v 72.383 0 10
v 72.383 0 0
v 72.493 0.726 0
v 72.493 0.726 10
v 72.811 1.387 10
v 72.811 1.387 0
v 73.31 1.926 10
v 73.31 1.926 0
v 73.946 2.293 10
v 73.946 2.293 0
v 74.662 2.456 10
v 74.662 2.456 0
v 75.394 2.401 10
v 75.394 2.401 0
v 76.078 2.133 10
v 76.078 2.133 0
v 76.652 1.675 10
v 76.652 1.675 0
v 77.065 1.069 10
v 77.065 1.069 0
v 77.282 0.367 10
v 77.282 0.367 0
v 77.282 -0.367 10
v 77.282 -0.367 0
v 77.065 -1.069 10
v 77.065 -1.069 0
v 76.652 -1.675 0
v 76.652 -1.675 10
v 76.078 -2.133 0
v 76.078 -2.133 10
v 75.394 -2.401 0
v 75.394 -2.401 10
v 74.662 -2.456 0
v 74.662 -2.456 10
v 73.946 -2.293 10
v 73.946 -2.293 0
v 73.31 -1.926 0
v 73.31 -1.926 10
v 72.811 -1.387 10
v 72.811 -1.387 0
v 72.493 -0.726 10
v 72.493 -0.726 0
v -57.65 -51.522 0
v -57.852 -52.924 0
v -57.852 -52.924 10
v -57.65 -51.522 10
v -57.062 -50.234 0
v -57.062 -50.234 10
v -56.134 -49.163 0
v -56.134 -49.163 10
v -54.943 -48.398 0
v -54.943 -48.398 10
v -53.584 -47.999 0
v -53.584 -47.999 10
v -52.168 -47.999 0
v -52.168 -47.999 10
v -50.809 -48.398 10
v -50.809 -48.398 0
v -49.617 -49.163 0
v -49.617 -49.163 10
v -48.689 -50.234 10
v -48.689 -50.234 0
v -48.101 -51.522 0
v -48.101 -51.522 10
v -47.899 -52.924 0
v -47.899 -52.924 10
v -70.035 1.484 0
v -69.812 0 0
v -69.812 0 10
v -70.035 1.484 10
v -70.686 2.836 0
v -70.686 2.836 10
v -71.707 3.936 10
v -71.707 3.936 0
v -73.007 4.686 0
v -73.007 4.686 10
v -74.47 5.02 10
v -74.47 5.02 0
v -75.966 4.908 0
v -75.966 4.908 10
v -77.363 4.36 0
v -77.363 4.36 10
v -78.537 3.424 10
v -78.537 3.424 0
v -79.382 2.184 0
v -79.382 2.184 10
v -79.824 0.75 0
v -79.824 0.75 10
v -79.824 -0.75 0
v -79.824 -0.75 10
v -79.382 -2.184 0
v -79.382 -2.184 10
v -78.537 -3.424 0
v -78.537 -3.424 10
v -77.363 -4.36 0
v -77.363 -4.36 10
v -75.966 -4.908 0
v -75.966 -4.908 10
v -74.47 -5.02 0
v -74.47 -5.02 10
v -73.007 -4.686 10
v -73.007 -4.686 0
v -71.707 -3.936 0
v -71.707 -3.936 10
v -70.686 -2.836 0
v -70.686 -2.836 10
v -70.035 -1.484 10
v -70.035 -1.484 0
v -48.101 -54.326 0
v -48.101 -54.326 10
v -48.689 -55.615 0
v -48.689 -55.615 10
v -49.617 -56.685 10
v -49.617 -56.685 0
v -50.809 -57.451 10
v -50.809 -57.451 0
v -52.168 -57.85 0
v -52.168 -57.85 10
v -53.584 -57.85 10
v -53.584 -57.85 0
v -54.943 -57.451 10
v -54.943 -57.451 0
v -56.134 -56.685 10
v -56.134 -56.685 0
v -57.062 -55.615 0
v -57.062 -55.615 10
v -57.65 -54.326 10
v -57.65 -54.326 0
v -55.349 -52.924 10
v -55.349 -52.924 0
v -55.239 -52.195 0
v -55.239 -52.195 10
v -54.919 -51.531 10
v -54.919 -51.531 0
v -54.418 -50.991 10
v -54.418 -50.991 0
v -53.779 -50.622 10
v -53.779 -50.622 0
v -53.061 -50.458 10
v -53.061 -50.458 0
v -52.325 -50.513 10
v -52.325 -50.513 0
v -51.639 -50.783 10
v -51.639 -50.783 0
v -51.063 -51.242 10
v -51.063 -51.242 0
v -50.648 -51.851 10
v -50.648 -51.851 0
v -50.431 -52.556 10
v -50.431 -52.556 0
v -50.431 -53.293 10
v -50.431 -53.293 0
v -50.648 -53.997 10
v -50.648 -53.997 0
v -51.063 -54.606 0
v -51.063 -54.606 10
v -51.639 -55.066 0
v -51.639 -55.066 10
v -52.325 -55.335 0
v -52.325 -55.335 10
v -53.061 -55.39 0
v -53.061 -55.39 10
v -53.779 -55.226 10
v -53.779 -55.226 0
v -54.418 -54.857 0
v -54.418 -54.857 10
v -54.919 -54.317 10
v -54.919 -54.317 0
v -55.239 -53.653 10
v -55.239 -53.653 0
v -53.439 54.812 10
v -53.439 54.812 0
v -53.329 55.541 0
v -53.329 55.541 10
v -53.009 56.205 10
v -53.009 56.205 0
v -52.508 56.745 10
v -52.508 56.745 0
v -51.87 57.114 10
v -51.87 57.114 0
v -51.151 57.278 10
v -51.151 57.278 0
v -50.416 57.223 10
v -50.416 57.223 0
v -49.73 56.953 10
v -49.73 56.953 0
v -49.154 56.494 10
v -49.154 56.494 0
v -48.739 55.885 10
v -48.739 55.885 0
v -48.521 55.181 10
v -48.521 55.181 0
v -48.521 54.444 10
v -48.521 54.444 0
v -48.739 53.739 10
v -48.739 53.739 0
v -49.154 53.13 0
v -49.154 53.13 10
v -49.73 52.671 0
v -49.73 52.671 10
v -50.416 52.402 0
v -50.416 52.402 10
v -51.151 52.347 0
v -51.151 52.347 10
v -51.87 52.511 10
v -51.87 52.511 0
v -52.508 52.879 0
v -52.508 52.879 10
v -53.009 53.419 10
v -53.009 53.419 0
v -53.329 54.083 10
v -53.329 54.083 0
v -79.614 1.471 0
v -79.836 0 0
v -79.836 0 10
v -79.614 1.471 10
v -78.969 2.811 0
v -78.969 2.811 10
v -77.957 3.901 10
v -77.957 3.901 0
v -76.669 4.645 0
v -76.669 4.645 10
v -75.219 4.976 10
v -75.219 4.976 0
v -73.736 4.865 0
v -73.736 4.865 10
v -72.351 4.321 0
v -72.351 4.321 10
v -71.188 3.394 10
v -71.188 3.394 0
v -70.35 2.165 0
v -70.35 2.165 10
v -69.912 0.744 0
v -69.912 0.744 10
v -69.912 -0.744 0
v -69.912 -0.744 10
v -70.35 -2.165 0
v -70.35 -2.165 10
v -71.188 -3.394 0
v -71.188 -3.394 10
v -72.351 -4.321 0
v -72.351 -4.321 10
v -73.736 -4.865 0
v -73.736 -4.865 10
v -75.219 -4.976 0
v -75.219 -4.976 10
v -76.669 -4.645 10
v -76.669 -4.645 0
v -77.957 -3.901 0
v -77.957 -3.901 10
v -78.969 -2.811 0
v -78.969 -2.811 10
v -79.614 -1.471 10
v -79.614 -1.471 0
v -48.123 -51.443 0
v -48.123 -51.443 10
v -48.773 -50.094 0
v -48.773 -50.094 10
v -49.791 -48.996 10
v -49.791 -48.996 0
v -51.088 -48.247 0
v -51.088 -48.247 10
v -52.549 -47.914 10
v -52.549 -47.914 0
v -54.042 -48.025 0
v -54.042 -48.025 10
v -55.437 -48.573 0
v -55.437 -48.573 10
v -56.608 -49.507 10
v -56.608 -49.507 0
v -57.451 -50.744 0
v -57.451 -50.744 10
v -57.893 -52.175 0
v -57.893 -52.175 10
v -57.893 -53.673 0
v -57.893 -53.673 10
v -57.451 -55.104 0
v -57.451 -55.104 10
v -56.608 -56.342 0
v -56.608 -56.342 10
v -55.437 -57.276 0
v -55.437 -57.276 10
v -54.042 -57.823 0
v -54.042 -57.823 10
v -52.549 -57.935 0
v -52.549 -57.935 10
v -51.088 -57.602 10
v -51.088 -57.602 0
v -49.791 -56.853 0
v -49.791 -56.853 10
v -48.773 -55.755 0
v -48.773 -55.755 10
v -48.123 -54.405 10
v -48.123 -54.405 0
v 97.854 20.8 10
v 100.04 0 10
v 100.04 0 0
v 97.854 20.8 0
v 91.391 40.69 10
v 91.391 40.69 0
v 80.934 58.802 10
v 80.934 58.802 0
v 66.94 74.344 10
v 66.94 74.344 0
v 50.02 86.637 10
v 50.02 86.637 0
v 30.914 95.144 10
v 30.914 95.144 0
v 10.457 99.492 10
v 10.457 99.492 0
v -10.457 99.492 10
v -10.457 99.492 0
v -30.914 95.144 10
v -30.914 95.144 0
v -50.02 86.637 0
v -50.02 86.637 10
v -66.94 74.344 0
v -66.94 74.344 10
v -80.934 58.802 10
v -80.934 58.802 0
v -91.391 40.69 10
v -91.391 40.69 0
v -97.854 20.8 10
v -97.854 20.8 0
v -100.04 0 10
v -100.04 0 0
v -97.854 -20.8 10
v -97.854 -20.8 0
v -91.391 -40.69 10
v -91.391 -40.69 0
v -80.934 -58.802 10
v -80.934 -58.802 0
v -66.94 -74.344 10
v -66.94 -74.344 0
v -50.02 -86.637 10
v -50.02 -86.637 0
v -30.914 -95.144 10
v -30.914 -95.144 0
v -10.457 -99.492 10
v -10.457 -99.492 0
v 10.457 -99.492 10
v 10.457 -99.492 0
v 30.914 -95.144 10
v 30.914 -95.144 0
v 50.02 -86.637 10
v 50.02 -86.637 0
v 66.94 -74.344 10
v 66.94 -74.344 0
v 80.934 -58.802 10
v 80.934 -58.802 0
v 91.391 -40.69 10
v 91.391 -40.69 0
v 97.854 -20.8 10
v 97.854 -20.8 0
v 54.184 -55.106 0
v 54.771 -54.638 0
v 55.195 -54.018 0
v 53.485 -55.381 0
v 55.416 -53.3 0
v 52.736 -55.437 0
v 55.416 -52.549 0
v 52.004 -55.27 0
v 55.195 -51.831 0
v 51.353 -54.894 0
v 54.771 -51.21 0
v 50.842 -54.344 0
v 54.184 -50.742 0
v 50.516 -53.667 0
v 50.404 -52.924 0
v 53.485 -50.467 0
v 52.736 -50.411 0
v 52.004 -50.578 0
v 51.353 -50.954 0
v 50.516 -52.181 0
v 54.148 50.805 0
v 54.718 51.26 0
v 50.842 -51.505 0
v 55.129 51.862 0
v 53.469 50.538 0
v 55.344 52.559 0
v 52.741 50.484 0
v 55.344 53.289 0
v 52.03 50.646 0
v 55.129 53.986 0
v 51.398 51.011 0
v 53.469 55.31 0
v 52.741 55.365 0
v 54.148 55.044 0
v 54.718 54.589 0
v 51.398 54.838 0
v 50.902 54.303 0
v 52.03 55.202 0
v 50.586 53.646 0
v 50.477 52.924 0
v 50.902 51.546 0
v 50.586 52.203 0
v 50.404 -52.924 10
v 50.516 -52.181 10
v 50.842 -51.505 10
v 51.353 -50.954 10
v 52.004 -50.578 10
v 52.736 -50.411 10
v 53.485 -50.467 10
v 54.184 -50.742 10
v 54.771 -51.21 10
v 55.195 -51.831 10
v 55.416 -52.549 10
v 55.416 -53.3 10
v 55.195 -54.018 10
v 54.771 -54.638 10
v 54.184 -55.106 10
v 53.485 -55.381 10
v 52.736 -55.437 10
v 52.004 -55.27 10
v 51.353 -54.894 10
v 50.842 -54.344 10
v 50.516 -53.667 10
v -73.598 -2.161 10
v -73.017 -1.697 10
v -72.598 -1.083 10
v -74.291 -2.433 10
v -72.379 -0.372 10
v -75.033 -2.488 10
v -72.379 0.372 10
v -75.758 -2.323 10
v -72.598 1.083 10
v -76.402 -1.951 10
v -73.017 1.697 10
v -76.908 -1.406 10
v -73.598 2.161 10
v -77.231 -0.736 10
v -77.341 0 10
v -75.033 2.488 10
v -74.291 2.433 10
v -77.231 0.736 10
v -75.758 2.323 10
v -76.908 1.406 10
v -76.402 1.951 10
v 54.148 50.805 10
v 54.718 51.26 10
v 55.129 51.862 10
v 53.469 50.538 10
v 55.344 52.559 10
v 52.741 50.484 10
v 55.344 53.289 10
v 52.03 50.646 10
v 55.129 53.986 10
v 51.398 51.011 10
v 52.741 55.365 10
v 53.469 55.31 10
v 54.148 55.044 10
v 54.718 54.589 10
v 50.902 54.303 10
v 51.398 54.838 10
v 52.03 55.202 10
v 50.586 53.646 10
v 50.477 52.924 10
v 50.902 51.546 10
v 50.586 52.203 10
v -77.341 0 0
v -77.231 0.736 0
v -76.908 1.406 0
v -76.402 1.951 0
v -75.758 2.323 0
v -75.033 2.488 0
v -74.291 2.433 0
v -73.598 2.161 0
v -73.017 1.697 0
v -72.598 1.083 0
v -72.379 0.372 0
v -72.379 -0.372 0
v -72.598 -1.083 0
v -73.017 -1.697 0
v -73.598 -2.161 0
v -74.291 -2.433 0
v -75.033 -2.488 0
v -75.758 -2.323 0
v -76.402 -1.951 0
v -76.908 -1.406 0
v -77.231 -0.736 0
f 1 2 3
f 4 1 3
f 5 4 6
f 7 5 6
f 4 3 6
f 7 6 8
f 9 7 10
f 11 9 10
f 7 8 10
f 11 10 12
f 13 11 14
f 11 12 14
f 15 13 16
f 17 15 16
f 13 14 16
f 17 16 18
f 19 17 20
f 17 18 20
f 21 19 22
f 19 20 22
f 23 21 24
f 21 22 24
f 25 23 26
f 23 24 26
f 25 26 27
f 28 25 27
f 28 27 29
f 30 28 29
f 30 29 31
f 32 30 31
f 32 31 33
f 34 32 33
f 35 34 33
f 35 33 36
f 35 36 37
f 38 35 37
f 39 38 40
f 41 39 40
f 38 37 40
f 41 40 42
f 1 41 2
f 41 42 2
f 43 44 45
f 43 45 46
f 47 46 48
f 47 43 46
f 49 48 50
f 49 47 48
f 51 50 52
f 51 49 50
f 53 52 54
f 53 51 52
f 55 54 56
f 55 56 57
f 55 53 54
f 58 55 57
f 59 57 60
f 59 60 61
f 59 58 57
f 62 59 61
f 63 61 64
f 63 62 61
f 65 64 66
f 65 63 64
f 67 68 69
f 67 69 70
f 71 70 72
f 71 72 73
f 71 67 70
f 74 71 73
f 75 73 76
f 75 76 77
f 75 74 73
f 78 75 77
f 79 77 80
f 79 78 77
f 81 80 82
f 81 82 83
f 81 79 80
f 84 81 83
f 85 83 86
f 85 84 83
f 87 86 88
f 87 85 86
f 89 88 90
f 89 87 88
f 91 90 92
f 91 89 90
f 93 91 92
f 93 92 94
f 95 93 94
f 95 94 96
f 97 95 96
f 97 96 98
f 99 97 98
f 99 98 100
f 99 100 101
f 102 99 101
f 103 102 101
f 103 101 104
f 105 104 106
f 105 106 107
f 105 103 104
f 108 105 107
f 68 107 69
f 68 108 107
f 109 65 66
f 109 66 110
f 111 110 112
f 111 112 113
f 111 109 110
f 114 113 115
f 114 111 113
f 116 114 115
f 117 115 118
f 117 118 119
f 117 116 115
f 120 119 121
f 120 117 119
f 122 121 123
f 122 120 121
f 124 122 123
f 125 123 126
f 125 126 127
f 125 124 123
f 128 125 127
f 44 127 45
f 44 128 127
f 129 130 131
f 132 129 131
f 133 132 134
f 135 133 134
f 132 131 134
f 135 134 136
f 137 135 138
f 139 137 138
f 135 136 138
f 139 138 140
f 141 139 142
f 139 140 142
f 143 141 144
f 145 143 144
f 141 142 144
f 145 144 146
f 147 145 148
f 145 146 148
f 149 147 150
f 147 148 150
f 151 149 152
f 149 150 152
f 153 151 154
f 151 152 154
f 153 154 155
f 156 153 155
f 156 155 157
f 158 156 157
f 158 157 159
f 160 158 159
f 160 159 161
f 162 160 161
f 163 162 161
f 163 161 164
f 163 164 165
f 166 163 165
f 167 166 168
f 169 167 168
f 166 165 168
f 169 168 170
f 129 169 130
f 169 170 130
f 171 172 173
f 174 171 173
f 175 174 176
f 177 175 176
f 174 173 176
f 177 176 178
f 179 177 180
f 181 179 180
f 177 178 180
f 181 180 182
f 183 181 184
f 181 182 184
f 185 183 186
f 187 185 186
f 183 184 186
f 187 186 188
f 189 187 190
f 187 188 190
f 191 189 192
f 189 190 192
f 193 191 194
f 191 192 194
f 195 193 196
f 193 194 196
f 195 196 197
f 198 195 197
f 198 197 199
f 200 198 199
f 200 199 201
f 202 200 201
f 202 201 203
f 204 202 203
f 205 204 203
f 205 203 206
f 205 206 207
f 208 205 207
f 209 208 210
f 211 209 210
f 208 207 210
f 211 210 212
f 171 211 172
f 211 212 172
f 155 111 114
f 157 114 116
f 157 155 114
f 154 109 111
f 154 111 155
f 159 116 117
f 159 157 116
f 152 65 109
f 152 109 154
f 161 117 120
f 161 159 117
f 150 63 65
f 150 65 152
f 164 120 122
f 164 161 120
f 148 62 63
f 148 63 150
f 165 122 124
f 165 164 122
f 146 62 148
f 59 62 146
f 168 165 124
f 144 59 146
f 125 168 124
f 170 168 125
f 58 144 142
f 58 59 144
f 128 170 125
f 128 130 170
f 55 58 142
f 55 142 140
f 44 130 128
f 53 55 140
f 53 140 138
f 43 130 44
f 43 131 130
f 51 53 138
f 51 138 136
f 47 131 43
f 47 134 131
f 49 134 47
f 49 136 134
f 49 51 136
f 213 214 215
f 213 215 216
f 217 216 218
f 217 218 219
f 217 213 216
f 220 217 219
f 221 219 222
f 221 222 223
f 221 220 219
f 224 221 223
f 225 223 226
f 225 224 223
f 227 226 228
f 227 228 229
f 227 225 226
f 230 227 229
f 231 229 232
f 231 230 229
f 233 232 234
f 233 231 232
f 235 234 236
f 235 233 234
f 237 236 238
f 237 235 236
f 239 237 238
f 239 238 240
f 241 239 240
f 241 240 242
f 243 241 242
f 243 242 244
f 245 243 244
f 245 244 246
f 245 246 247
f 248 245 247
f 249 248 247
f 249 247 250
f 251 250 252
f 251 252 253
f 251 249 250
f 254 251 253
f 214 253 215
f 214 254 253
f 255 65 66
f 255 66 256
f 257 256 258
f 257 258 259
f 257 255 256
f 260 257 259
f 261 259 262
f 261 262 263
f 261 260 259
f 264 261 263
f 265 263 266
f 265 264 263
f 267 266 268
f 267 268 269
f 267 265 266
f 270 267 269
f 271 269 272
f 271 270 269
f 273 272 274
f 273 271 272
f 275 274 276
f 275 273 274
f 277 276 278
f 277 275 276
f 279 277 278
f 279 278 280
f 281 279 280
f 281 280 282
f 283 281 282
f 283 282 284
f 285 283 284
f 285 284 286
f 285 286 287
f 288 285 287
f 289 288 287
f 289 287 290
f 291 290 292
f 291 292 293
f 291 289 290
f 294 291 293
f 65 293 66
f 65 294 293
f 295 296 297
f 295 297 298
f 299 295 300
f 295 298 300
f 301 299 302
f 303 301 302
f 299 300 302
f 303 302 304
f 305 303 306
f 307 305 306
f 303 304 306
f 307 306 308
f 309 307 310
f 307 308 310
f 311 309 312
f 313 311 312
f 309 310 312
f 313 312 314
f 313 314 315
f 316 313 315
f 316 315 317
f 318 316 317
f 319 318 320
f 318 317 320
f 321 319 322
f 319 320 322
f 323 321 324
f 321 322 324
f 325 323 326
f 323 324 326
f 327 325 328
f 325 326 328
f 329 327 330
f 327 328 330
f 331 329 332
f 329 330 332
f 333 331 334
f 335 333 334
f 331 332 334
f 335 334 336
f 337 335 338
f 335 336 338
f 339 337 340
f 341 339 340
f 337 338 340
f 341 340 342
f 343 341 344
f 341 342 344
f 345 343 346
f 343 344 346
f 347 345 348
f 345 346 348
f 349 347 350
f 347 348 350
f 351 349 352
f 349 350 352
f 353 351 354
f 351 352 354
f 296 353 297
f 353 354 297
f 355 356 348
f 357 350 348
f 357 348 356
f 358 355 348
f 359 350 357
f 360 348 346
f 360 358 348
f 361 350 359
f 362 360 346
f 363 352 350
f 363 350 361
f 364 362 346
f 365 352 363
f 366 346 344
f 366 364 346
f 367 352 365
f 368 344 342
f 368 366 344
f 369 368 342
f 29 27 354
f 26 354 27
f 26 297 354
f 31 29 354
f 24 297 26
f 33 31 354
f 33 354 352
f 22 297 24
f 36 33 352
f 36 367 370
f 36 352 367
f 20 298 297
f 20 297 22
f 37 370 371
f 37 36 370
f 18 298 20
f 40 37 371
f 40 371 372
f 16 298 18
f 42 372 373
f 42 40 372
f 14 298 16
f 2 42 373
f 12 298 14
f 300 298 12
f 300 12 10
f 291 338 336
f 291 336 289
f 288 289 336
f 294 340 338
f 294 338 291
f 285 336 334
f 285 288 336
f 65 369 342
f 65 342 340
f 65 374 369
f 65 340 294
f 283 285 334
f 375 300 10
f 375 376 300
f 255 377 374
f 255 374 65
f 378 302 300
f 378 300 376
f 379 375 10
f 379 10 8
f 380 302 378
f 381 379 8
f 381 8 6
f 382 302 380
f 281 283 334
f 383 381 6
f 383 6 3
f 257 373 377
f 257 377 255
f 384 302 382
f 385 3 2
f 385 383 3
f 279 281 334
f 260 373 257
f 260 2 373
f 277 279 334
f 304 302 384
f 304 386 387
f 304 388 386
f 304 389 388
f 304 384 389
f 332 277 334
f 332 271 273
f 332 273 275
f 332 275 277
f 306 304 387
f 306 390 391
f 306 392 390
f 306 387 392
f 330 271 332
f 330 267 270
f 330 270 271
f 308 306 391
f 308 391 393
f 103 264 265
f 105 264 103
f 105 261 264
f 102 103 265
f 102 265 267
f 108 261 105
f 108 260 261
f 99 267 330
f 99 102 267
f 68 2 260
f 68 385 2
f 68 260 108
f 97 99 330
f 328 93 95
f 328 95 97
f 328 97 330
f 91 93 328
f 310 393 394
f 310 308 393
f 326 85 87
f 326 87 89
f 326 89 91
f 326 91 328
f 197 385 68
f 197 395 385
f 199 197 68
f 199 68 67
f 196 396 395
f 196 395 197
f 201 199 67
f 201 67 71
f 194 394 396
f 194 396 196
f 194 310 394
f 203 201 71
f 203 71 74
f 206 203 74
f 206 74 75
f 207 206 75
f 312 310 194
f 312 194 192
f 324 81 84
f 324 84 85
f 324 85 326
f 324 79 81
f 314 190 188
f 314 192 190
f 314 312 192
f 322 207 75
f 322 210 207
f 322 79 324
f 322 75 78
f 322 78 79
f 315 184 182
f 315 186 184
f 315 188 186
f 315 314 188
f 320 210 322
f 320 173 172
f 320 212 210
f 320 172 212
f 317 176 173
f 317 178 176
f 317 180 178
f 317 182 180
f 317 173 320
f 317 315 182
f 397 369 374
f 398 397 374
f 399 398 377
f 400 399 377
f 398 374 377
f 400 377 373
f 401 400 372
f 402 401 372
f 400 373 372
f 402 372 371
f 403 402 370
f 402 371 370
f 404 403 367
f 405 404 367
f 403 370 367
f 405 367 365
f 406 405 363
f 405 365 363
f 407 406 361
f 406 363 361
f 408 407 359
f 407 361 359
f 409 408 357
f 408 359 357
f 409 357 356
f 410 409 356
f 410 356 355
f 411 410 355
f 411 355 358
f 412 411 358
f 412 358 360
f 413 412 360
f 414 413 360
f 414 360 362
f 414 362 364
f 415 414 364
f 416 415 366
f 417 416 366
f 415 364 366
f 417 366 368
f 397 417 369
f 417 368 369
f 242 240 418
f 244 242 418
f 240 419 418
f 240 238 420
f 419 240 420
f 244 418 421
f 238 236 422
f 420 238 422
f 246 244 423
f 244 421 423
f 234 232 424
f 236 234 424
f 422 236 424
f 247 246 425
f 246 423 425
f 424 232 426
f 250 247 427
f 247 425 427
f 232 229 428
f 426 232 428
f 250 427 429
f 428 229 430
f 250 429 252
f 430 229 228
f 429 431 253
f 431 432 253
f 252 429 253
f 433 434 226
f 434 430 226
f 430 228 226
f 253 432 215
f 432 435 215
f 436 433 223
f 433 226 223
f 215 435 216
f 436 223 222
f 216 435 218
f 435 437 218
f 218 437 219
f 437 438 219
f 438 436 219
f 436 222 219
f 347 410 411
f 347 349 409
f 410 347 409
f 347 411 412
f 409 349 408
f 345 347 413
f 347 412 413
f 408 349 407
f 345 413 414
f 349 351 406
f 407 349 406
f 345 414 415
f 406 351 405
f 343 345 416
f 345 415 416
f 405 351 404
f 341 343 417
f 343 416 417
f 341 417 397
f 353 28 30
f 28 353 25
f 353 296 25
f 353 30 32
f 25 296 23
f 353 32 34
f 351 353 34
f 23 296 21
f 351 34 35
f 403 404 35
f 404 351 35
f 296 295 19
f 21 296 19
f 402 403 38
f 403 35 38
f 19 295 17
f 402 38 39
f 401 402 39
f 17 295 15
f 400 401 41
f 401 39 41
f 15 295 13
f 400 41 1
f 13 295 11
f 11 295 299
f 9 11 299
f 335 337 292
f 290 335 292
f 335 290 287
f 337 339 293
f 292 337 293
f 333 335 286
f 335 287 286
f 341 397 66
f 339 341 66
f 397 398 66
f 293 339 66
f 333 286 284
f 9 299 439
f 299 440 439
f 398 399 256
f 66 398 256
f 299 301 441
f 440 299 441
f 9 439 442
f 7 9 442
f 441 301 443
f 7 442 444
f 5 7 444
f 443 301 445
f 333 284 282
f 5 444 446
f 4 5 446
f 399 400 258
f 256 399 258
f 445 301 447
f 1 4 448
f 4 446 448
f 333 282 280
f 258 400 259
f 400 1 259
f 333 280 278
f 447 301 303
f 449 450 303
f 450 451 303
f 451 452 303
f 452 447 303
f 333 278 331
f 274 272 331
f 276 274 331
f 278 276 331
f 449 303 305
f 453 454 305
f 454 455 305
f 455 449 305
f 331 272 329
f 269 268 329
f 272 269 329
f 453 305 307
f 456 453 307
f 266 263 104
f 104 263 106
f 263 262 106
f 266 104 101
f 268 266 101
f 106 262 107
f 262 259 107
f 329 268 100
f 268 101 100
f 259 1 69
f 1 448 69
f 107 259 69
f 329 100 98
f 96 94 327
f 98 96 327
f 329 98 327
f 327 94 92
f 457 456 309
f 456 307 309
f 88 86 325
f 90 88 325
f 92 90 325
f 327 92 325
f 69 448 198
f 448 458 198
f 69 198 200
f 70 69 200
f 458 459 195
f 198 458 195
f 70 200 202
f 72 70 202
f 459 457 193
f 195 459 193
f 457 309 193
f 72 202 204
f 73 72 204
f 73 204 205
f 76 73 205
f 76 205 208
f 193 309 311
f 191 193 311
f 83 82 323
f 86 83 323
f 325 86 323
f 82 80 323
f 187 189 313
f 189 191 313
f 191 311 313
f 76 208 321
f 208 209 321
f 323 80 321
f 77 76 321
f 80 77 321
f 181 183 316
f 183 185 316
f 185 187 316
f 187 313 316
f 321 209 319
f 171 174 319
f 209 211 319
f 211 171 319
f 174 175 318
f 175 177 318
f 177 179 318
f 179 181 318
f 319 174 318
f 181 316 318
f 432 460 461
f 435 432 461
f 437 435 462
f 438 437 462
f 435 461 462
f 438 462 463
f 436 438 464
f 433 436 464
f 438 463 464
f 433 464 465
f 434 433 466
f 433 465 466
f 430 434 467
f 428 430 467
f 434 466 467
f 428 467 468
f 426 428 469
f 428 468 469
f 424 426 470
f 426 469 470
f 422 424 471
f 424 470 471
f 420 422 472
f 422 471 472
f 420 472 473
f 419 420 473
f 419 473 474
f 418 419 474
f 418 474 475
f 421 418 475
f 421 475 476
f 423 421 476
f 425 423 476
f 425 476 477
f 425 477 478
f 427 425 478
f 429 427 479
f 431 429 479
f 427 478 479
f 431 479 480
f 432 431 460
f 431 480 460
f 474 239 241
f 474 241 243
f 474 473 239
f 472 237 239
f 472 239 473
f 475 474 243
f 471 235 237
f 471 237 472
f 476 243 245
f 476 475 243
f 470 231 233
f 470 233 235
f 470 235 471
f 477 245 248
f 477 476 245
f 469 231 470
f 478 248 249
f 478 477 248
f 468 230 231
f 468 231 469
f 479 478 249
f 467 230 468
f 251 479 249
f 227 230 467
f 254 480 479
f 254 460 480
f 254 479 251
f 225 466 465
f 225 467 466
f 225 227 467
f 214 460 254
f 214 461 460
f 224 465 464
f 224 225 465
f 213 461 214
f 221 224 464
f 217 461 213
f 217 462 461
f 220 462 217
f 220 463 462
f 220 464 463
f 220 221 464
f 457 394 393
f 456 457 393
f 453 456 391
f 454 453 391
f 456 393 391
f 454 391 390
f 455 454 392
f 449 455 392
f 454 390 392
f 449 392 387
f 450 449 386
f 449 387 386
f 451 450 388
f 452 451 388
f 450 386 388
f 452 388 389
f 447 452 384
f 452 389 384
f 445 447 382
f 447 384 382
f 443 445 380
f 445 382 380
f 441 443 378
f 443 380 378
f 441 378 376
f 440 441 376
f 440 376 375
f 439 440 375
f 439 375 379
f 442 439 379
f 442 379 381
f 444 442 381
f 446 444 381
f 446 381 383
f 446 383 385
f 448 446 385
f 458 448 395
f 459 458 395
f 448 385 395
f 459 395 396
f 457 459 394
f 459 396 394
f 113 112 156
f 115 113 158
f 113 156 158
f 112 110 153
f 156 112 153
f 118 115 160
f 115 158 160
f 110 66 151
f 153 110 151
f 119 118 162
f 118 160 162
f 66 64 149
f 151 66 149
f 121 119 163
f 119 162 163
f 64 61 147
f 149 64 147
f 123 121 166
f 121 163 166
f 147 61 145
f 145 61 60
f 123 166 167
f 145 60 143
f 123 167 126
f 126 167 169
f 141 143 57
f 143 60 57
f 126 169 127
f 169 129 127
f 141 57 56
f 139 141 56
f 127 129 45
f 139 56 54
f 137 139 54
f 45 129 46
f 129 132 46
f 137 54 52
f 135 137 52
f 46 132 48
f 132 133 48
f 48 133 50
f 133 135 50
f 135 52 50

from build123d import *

# Parameters (mm, degrees)
SKETCH1_R           = 100.040239399
SKETCH1_R_2         = 4.999787409
SKETCH1_R_3         = 4.994100705
SKETCH1_R_4         = 4.985498273
SKETCH1_R_5         = 5.024681181
SKETCH1_R_6         = 5.034429614
SKETCH1_R_7         = 5.005688948
BOSS_EXTRUDE1_DEPTH = 10
SKETCH2_R           = 4.994100705
SKETCH2_R_2         = 2.462950525
BOSS_EXTRUDE2_DEPTH = 10
SKETCH3_R           = 4.990024035
SKETCH3_R_2         = 2.495309741
SKETCH3_R_3         = 4.999787409
SKETCH3_R_4         = 2.519899569
SKETCH3_R_5         = 4.976252145
SKETCH3_R_6         = 2.472796097
SKETCH3_R_7         = 5.005688948
SKETCH3_R_8         = 2.472512655
SKETCH3_R_9         = 4.985498273
SKETCH3_R_10        = 2.447326027
BOSS_EXTRUDE4_DEPTH = 10


with BuildPart() as part:
    # Sketch1 → Boss-Extrude1 (new body)
    with BuildSketch(Plane.XY):
        Circle(SKETCH1_R)
        with Locations((52.924174166, -52.924174166)):
            Circle(SKETCH1_R_2, mode=Mode.SUBTRACT)
        with Locations((74.846084883, 0)):
            Circle(SKETCH1_R_3, mode=Mode.SUBTRACT)
        with Locations((52.924174166, 52.924174166)):
            Circle(SKETCH1_R_4, mode=Mode.SUBTRACT)
        with Locations((-52.924174166, -52.924174166)):
            Circle(SKETCH1_R_5, mode=Mode.SUBTRACT)
        with Locations((-74.846084883, 0)):
            Circle(SKETCH1_R_6, mode=Mode.SUBTRACT)
        with Locations((-50.96624125, 54.812212828)):
            Circle(SKETCH1_R_7, mode=Mode.SUBTRACT)
    extrude(amount=BOSS_EXTRUDE1_DEPTH)

    # Sketch2 → Boss-Extrude2 (add)
    with BuildSketch(Plane(origin=(0, 0, 0), x_dir=(-1, 0, 0), z_dir=(0, 0, -1))):
        with Locations((-74.846084883, 0)):
            Circle(SKETCH2_R)
        with Locations((-74.846084883, 0)):
            Circle(SKETCH2_R_2, mode=Mode.SUBTRACT)
    extrude(amount=-BOSS_EXTRUDE2_DEPTH)

    # Sketch3 → Boss-Extrude4 (add)
    with BuildSketch(Plane(origin=(0, 0, 0), x_dir=(-1, 0, 0), z_dir=(0, 0, -1))):
        with Locations((74.846084883, 0)):
            Circle(SKETCH3_R)
        with Locations((74.846084883, 0)):
            Circle(SKETCH3_R_2, mode=Mode.SUBTRACT)
        with Locations((-52.924174166, -52.924174166)):
            Circle(SKETCH3_R_3)
        with Locations((-52.924174166, -52.924174166)):
            Circle(SKETCH3_R_4, mode=Mode.SUBTRACT)
        with Locations((52.875745129, -52.924174166)):
            Circle(SKETCH3_R_5)
        with Locations((52.875745129, -52.924174166)):
            Circle(SKETCH3_R_6, mode=Mode.SUBTRACT)
        with Locations((50.96624125, 54.812212828)):
            Circle(SKETCH3_R_7)
        with Locations((50.96624125, 54.812212828)):
            Circle(SKETCH3_R_8, mode=Mode.SUBTRACT)
        with Locations((-52.924174166, 52.924174166)):
            Circle(SKETCH3_R_9)
        with Locations((-52.924174166, 52.924174166)):
            Circle(SKETCH3_R_10, mode=Mode.SUBTRACT)
    extrude(amount=-BOSS_EXTRUDE4_DEPTH)


solid = part.part
